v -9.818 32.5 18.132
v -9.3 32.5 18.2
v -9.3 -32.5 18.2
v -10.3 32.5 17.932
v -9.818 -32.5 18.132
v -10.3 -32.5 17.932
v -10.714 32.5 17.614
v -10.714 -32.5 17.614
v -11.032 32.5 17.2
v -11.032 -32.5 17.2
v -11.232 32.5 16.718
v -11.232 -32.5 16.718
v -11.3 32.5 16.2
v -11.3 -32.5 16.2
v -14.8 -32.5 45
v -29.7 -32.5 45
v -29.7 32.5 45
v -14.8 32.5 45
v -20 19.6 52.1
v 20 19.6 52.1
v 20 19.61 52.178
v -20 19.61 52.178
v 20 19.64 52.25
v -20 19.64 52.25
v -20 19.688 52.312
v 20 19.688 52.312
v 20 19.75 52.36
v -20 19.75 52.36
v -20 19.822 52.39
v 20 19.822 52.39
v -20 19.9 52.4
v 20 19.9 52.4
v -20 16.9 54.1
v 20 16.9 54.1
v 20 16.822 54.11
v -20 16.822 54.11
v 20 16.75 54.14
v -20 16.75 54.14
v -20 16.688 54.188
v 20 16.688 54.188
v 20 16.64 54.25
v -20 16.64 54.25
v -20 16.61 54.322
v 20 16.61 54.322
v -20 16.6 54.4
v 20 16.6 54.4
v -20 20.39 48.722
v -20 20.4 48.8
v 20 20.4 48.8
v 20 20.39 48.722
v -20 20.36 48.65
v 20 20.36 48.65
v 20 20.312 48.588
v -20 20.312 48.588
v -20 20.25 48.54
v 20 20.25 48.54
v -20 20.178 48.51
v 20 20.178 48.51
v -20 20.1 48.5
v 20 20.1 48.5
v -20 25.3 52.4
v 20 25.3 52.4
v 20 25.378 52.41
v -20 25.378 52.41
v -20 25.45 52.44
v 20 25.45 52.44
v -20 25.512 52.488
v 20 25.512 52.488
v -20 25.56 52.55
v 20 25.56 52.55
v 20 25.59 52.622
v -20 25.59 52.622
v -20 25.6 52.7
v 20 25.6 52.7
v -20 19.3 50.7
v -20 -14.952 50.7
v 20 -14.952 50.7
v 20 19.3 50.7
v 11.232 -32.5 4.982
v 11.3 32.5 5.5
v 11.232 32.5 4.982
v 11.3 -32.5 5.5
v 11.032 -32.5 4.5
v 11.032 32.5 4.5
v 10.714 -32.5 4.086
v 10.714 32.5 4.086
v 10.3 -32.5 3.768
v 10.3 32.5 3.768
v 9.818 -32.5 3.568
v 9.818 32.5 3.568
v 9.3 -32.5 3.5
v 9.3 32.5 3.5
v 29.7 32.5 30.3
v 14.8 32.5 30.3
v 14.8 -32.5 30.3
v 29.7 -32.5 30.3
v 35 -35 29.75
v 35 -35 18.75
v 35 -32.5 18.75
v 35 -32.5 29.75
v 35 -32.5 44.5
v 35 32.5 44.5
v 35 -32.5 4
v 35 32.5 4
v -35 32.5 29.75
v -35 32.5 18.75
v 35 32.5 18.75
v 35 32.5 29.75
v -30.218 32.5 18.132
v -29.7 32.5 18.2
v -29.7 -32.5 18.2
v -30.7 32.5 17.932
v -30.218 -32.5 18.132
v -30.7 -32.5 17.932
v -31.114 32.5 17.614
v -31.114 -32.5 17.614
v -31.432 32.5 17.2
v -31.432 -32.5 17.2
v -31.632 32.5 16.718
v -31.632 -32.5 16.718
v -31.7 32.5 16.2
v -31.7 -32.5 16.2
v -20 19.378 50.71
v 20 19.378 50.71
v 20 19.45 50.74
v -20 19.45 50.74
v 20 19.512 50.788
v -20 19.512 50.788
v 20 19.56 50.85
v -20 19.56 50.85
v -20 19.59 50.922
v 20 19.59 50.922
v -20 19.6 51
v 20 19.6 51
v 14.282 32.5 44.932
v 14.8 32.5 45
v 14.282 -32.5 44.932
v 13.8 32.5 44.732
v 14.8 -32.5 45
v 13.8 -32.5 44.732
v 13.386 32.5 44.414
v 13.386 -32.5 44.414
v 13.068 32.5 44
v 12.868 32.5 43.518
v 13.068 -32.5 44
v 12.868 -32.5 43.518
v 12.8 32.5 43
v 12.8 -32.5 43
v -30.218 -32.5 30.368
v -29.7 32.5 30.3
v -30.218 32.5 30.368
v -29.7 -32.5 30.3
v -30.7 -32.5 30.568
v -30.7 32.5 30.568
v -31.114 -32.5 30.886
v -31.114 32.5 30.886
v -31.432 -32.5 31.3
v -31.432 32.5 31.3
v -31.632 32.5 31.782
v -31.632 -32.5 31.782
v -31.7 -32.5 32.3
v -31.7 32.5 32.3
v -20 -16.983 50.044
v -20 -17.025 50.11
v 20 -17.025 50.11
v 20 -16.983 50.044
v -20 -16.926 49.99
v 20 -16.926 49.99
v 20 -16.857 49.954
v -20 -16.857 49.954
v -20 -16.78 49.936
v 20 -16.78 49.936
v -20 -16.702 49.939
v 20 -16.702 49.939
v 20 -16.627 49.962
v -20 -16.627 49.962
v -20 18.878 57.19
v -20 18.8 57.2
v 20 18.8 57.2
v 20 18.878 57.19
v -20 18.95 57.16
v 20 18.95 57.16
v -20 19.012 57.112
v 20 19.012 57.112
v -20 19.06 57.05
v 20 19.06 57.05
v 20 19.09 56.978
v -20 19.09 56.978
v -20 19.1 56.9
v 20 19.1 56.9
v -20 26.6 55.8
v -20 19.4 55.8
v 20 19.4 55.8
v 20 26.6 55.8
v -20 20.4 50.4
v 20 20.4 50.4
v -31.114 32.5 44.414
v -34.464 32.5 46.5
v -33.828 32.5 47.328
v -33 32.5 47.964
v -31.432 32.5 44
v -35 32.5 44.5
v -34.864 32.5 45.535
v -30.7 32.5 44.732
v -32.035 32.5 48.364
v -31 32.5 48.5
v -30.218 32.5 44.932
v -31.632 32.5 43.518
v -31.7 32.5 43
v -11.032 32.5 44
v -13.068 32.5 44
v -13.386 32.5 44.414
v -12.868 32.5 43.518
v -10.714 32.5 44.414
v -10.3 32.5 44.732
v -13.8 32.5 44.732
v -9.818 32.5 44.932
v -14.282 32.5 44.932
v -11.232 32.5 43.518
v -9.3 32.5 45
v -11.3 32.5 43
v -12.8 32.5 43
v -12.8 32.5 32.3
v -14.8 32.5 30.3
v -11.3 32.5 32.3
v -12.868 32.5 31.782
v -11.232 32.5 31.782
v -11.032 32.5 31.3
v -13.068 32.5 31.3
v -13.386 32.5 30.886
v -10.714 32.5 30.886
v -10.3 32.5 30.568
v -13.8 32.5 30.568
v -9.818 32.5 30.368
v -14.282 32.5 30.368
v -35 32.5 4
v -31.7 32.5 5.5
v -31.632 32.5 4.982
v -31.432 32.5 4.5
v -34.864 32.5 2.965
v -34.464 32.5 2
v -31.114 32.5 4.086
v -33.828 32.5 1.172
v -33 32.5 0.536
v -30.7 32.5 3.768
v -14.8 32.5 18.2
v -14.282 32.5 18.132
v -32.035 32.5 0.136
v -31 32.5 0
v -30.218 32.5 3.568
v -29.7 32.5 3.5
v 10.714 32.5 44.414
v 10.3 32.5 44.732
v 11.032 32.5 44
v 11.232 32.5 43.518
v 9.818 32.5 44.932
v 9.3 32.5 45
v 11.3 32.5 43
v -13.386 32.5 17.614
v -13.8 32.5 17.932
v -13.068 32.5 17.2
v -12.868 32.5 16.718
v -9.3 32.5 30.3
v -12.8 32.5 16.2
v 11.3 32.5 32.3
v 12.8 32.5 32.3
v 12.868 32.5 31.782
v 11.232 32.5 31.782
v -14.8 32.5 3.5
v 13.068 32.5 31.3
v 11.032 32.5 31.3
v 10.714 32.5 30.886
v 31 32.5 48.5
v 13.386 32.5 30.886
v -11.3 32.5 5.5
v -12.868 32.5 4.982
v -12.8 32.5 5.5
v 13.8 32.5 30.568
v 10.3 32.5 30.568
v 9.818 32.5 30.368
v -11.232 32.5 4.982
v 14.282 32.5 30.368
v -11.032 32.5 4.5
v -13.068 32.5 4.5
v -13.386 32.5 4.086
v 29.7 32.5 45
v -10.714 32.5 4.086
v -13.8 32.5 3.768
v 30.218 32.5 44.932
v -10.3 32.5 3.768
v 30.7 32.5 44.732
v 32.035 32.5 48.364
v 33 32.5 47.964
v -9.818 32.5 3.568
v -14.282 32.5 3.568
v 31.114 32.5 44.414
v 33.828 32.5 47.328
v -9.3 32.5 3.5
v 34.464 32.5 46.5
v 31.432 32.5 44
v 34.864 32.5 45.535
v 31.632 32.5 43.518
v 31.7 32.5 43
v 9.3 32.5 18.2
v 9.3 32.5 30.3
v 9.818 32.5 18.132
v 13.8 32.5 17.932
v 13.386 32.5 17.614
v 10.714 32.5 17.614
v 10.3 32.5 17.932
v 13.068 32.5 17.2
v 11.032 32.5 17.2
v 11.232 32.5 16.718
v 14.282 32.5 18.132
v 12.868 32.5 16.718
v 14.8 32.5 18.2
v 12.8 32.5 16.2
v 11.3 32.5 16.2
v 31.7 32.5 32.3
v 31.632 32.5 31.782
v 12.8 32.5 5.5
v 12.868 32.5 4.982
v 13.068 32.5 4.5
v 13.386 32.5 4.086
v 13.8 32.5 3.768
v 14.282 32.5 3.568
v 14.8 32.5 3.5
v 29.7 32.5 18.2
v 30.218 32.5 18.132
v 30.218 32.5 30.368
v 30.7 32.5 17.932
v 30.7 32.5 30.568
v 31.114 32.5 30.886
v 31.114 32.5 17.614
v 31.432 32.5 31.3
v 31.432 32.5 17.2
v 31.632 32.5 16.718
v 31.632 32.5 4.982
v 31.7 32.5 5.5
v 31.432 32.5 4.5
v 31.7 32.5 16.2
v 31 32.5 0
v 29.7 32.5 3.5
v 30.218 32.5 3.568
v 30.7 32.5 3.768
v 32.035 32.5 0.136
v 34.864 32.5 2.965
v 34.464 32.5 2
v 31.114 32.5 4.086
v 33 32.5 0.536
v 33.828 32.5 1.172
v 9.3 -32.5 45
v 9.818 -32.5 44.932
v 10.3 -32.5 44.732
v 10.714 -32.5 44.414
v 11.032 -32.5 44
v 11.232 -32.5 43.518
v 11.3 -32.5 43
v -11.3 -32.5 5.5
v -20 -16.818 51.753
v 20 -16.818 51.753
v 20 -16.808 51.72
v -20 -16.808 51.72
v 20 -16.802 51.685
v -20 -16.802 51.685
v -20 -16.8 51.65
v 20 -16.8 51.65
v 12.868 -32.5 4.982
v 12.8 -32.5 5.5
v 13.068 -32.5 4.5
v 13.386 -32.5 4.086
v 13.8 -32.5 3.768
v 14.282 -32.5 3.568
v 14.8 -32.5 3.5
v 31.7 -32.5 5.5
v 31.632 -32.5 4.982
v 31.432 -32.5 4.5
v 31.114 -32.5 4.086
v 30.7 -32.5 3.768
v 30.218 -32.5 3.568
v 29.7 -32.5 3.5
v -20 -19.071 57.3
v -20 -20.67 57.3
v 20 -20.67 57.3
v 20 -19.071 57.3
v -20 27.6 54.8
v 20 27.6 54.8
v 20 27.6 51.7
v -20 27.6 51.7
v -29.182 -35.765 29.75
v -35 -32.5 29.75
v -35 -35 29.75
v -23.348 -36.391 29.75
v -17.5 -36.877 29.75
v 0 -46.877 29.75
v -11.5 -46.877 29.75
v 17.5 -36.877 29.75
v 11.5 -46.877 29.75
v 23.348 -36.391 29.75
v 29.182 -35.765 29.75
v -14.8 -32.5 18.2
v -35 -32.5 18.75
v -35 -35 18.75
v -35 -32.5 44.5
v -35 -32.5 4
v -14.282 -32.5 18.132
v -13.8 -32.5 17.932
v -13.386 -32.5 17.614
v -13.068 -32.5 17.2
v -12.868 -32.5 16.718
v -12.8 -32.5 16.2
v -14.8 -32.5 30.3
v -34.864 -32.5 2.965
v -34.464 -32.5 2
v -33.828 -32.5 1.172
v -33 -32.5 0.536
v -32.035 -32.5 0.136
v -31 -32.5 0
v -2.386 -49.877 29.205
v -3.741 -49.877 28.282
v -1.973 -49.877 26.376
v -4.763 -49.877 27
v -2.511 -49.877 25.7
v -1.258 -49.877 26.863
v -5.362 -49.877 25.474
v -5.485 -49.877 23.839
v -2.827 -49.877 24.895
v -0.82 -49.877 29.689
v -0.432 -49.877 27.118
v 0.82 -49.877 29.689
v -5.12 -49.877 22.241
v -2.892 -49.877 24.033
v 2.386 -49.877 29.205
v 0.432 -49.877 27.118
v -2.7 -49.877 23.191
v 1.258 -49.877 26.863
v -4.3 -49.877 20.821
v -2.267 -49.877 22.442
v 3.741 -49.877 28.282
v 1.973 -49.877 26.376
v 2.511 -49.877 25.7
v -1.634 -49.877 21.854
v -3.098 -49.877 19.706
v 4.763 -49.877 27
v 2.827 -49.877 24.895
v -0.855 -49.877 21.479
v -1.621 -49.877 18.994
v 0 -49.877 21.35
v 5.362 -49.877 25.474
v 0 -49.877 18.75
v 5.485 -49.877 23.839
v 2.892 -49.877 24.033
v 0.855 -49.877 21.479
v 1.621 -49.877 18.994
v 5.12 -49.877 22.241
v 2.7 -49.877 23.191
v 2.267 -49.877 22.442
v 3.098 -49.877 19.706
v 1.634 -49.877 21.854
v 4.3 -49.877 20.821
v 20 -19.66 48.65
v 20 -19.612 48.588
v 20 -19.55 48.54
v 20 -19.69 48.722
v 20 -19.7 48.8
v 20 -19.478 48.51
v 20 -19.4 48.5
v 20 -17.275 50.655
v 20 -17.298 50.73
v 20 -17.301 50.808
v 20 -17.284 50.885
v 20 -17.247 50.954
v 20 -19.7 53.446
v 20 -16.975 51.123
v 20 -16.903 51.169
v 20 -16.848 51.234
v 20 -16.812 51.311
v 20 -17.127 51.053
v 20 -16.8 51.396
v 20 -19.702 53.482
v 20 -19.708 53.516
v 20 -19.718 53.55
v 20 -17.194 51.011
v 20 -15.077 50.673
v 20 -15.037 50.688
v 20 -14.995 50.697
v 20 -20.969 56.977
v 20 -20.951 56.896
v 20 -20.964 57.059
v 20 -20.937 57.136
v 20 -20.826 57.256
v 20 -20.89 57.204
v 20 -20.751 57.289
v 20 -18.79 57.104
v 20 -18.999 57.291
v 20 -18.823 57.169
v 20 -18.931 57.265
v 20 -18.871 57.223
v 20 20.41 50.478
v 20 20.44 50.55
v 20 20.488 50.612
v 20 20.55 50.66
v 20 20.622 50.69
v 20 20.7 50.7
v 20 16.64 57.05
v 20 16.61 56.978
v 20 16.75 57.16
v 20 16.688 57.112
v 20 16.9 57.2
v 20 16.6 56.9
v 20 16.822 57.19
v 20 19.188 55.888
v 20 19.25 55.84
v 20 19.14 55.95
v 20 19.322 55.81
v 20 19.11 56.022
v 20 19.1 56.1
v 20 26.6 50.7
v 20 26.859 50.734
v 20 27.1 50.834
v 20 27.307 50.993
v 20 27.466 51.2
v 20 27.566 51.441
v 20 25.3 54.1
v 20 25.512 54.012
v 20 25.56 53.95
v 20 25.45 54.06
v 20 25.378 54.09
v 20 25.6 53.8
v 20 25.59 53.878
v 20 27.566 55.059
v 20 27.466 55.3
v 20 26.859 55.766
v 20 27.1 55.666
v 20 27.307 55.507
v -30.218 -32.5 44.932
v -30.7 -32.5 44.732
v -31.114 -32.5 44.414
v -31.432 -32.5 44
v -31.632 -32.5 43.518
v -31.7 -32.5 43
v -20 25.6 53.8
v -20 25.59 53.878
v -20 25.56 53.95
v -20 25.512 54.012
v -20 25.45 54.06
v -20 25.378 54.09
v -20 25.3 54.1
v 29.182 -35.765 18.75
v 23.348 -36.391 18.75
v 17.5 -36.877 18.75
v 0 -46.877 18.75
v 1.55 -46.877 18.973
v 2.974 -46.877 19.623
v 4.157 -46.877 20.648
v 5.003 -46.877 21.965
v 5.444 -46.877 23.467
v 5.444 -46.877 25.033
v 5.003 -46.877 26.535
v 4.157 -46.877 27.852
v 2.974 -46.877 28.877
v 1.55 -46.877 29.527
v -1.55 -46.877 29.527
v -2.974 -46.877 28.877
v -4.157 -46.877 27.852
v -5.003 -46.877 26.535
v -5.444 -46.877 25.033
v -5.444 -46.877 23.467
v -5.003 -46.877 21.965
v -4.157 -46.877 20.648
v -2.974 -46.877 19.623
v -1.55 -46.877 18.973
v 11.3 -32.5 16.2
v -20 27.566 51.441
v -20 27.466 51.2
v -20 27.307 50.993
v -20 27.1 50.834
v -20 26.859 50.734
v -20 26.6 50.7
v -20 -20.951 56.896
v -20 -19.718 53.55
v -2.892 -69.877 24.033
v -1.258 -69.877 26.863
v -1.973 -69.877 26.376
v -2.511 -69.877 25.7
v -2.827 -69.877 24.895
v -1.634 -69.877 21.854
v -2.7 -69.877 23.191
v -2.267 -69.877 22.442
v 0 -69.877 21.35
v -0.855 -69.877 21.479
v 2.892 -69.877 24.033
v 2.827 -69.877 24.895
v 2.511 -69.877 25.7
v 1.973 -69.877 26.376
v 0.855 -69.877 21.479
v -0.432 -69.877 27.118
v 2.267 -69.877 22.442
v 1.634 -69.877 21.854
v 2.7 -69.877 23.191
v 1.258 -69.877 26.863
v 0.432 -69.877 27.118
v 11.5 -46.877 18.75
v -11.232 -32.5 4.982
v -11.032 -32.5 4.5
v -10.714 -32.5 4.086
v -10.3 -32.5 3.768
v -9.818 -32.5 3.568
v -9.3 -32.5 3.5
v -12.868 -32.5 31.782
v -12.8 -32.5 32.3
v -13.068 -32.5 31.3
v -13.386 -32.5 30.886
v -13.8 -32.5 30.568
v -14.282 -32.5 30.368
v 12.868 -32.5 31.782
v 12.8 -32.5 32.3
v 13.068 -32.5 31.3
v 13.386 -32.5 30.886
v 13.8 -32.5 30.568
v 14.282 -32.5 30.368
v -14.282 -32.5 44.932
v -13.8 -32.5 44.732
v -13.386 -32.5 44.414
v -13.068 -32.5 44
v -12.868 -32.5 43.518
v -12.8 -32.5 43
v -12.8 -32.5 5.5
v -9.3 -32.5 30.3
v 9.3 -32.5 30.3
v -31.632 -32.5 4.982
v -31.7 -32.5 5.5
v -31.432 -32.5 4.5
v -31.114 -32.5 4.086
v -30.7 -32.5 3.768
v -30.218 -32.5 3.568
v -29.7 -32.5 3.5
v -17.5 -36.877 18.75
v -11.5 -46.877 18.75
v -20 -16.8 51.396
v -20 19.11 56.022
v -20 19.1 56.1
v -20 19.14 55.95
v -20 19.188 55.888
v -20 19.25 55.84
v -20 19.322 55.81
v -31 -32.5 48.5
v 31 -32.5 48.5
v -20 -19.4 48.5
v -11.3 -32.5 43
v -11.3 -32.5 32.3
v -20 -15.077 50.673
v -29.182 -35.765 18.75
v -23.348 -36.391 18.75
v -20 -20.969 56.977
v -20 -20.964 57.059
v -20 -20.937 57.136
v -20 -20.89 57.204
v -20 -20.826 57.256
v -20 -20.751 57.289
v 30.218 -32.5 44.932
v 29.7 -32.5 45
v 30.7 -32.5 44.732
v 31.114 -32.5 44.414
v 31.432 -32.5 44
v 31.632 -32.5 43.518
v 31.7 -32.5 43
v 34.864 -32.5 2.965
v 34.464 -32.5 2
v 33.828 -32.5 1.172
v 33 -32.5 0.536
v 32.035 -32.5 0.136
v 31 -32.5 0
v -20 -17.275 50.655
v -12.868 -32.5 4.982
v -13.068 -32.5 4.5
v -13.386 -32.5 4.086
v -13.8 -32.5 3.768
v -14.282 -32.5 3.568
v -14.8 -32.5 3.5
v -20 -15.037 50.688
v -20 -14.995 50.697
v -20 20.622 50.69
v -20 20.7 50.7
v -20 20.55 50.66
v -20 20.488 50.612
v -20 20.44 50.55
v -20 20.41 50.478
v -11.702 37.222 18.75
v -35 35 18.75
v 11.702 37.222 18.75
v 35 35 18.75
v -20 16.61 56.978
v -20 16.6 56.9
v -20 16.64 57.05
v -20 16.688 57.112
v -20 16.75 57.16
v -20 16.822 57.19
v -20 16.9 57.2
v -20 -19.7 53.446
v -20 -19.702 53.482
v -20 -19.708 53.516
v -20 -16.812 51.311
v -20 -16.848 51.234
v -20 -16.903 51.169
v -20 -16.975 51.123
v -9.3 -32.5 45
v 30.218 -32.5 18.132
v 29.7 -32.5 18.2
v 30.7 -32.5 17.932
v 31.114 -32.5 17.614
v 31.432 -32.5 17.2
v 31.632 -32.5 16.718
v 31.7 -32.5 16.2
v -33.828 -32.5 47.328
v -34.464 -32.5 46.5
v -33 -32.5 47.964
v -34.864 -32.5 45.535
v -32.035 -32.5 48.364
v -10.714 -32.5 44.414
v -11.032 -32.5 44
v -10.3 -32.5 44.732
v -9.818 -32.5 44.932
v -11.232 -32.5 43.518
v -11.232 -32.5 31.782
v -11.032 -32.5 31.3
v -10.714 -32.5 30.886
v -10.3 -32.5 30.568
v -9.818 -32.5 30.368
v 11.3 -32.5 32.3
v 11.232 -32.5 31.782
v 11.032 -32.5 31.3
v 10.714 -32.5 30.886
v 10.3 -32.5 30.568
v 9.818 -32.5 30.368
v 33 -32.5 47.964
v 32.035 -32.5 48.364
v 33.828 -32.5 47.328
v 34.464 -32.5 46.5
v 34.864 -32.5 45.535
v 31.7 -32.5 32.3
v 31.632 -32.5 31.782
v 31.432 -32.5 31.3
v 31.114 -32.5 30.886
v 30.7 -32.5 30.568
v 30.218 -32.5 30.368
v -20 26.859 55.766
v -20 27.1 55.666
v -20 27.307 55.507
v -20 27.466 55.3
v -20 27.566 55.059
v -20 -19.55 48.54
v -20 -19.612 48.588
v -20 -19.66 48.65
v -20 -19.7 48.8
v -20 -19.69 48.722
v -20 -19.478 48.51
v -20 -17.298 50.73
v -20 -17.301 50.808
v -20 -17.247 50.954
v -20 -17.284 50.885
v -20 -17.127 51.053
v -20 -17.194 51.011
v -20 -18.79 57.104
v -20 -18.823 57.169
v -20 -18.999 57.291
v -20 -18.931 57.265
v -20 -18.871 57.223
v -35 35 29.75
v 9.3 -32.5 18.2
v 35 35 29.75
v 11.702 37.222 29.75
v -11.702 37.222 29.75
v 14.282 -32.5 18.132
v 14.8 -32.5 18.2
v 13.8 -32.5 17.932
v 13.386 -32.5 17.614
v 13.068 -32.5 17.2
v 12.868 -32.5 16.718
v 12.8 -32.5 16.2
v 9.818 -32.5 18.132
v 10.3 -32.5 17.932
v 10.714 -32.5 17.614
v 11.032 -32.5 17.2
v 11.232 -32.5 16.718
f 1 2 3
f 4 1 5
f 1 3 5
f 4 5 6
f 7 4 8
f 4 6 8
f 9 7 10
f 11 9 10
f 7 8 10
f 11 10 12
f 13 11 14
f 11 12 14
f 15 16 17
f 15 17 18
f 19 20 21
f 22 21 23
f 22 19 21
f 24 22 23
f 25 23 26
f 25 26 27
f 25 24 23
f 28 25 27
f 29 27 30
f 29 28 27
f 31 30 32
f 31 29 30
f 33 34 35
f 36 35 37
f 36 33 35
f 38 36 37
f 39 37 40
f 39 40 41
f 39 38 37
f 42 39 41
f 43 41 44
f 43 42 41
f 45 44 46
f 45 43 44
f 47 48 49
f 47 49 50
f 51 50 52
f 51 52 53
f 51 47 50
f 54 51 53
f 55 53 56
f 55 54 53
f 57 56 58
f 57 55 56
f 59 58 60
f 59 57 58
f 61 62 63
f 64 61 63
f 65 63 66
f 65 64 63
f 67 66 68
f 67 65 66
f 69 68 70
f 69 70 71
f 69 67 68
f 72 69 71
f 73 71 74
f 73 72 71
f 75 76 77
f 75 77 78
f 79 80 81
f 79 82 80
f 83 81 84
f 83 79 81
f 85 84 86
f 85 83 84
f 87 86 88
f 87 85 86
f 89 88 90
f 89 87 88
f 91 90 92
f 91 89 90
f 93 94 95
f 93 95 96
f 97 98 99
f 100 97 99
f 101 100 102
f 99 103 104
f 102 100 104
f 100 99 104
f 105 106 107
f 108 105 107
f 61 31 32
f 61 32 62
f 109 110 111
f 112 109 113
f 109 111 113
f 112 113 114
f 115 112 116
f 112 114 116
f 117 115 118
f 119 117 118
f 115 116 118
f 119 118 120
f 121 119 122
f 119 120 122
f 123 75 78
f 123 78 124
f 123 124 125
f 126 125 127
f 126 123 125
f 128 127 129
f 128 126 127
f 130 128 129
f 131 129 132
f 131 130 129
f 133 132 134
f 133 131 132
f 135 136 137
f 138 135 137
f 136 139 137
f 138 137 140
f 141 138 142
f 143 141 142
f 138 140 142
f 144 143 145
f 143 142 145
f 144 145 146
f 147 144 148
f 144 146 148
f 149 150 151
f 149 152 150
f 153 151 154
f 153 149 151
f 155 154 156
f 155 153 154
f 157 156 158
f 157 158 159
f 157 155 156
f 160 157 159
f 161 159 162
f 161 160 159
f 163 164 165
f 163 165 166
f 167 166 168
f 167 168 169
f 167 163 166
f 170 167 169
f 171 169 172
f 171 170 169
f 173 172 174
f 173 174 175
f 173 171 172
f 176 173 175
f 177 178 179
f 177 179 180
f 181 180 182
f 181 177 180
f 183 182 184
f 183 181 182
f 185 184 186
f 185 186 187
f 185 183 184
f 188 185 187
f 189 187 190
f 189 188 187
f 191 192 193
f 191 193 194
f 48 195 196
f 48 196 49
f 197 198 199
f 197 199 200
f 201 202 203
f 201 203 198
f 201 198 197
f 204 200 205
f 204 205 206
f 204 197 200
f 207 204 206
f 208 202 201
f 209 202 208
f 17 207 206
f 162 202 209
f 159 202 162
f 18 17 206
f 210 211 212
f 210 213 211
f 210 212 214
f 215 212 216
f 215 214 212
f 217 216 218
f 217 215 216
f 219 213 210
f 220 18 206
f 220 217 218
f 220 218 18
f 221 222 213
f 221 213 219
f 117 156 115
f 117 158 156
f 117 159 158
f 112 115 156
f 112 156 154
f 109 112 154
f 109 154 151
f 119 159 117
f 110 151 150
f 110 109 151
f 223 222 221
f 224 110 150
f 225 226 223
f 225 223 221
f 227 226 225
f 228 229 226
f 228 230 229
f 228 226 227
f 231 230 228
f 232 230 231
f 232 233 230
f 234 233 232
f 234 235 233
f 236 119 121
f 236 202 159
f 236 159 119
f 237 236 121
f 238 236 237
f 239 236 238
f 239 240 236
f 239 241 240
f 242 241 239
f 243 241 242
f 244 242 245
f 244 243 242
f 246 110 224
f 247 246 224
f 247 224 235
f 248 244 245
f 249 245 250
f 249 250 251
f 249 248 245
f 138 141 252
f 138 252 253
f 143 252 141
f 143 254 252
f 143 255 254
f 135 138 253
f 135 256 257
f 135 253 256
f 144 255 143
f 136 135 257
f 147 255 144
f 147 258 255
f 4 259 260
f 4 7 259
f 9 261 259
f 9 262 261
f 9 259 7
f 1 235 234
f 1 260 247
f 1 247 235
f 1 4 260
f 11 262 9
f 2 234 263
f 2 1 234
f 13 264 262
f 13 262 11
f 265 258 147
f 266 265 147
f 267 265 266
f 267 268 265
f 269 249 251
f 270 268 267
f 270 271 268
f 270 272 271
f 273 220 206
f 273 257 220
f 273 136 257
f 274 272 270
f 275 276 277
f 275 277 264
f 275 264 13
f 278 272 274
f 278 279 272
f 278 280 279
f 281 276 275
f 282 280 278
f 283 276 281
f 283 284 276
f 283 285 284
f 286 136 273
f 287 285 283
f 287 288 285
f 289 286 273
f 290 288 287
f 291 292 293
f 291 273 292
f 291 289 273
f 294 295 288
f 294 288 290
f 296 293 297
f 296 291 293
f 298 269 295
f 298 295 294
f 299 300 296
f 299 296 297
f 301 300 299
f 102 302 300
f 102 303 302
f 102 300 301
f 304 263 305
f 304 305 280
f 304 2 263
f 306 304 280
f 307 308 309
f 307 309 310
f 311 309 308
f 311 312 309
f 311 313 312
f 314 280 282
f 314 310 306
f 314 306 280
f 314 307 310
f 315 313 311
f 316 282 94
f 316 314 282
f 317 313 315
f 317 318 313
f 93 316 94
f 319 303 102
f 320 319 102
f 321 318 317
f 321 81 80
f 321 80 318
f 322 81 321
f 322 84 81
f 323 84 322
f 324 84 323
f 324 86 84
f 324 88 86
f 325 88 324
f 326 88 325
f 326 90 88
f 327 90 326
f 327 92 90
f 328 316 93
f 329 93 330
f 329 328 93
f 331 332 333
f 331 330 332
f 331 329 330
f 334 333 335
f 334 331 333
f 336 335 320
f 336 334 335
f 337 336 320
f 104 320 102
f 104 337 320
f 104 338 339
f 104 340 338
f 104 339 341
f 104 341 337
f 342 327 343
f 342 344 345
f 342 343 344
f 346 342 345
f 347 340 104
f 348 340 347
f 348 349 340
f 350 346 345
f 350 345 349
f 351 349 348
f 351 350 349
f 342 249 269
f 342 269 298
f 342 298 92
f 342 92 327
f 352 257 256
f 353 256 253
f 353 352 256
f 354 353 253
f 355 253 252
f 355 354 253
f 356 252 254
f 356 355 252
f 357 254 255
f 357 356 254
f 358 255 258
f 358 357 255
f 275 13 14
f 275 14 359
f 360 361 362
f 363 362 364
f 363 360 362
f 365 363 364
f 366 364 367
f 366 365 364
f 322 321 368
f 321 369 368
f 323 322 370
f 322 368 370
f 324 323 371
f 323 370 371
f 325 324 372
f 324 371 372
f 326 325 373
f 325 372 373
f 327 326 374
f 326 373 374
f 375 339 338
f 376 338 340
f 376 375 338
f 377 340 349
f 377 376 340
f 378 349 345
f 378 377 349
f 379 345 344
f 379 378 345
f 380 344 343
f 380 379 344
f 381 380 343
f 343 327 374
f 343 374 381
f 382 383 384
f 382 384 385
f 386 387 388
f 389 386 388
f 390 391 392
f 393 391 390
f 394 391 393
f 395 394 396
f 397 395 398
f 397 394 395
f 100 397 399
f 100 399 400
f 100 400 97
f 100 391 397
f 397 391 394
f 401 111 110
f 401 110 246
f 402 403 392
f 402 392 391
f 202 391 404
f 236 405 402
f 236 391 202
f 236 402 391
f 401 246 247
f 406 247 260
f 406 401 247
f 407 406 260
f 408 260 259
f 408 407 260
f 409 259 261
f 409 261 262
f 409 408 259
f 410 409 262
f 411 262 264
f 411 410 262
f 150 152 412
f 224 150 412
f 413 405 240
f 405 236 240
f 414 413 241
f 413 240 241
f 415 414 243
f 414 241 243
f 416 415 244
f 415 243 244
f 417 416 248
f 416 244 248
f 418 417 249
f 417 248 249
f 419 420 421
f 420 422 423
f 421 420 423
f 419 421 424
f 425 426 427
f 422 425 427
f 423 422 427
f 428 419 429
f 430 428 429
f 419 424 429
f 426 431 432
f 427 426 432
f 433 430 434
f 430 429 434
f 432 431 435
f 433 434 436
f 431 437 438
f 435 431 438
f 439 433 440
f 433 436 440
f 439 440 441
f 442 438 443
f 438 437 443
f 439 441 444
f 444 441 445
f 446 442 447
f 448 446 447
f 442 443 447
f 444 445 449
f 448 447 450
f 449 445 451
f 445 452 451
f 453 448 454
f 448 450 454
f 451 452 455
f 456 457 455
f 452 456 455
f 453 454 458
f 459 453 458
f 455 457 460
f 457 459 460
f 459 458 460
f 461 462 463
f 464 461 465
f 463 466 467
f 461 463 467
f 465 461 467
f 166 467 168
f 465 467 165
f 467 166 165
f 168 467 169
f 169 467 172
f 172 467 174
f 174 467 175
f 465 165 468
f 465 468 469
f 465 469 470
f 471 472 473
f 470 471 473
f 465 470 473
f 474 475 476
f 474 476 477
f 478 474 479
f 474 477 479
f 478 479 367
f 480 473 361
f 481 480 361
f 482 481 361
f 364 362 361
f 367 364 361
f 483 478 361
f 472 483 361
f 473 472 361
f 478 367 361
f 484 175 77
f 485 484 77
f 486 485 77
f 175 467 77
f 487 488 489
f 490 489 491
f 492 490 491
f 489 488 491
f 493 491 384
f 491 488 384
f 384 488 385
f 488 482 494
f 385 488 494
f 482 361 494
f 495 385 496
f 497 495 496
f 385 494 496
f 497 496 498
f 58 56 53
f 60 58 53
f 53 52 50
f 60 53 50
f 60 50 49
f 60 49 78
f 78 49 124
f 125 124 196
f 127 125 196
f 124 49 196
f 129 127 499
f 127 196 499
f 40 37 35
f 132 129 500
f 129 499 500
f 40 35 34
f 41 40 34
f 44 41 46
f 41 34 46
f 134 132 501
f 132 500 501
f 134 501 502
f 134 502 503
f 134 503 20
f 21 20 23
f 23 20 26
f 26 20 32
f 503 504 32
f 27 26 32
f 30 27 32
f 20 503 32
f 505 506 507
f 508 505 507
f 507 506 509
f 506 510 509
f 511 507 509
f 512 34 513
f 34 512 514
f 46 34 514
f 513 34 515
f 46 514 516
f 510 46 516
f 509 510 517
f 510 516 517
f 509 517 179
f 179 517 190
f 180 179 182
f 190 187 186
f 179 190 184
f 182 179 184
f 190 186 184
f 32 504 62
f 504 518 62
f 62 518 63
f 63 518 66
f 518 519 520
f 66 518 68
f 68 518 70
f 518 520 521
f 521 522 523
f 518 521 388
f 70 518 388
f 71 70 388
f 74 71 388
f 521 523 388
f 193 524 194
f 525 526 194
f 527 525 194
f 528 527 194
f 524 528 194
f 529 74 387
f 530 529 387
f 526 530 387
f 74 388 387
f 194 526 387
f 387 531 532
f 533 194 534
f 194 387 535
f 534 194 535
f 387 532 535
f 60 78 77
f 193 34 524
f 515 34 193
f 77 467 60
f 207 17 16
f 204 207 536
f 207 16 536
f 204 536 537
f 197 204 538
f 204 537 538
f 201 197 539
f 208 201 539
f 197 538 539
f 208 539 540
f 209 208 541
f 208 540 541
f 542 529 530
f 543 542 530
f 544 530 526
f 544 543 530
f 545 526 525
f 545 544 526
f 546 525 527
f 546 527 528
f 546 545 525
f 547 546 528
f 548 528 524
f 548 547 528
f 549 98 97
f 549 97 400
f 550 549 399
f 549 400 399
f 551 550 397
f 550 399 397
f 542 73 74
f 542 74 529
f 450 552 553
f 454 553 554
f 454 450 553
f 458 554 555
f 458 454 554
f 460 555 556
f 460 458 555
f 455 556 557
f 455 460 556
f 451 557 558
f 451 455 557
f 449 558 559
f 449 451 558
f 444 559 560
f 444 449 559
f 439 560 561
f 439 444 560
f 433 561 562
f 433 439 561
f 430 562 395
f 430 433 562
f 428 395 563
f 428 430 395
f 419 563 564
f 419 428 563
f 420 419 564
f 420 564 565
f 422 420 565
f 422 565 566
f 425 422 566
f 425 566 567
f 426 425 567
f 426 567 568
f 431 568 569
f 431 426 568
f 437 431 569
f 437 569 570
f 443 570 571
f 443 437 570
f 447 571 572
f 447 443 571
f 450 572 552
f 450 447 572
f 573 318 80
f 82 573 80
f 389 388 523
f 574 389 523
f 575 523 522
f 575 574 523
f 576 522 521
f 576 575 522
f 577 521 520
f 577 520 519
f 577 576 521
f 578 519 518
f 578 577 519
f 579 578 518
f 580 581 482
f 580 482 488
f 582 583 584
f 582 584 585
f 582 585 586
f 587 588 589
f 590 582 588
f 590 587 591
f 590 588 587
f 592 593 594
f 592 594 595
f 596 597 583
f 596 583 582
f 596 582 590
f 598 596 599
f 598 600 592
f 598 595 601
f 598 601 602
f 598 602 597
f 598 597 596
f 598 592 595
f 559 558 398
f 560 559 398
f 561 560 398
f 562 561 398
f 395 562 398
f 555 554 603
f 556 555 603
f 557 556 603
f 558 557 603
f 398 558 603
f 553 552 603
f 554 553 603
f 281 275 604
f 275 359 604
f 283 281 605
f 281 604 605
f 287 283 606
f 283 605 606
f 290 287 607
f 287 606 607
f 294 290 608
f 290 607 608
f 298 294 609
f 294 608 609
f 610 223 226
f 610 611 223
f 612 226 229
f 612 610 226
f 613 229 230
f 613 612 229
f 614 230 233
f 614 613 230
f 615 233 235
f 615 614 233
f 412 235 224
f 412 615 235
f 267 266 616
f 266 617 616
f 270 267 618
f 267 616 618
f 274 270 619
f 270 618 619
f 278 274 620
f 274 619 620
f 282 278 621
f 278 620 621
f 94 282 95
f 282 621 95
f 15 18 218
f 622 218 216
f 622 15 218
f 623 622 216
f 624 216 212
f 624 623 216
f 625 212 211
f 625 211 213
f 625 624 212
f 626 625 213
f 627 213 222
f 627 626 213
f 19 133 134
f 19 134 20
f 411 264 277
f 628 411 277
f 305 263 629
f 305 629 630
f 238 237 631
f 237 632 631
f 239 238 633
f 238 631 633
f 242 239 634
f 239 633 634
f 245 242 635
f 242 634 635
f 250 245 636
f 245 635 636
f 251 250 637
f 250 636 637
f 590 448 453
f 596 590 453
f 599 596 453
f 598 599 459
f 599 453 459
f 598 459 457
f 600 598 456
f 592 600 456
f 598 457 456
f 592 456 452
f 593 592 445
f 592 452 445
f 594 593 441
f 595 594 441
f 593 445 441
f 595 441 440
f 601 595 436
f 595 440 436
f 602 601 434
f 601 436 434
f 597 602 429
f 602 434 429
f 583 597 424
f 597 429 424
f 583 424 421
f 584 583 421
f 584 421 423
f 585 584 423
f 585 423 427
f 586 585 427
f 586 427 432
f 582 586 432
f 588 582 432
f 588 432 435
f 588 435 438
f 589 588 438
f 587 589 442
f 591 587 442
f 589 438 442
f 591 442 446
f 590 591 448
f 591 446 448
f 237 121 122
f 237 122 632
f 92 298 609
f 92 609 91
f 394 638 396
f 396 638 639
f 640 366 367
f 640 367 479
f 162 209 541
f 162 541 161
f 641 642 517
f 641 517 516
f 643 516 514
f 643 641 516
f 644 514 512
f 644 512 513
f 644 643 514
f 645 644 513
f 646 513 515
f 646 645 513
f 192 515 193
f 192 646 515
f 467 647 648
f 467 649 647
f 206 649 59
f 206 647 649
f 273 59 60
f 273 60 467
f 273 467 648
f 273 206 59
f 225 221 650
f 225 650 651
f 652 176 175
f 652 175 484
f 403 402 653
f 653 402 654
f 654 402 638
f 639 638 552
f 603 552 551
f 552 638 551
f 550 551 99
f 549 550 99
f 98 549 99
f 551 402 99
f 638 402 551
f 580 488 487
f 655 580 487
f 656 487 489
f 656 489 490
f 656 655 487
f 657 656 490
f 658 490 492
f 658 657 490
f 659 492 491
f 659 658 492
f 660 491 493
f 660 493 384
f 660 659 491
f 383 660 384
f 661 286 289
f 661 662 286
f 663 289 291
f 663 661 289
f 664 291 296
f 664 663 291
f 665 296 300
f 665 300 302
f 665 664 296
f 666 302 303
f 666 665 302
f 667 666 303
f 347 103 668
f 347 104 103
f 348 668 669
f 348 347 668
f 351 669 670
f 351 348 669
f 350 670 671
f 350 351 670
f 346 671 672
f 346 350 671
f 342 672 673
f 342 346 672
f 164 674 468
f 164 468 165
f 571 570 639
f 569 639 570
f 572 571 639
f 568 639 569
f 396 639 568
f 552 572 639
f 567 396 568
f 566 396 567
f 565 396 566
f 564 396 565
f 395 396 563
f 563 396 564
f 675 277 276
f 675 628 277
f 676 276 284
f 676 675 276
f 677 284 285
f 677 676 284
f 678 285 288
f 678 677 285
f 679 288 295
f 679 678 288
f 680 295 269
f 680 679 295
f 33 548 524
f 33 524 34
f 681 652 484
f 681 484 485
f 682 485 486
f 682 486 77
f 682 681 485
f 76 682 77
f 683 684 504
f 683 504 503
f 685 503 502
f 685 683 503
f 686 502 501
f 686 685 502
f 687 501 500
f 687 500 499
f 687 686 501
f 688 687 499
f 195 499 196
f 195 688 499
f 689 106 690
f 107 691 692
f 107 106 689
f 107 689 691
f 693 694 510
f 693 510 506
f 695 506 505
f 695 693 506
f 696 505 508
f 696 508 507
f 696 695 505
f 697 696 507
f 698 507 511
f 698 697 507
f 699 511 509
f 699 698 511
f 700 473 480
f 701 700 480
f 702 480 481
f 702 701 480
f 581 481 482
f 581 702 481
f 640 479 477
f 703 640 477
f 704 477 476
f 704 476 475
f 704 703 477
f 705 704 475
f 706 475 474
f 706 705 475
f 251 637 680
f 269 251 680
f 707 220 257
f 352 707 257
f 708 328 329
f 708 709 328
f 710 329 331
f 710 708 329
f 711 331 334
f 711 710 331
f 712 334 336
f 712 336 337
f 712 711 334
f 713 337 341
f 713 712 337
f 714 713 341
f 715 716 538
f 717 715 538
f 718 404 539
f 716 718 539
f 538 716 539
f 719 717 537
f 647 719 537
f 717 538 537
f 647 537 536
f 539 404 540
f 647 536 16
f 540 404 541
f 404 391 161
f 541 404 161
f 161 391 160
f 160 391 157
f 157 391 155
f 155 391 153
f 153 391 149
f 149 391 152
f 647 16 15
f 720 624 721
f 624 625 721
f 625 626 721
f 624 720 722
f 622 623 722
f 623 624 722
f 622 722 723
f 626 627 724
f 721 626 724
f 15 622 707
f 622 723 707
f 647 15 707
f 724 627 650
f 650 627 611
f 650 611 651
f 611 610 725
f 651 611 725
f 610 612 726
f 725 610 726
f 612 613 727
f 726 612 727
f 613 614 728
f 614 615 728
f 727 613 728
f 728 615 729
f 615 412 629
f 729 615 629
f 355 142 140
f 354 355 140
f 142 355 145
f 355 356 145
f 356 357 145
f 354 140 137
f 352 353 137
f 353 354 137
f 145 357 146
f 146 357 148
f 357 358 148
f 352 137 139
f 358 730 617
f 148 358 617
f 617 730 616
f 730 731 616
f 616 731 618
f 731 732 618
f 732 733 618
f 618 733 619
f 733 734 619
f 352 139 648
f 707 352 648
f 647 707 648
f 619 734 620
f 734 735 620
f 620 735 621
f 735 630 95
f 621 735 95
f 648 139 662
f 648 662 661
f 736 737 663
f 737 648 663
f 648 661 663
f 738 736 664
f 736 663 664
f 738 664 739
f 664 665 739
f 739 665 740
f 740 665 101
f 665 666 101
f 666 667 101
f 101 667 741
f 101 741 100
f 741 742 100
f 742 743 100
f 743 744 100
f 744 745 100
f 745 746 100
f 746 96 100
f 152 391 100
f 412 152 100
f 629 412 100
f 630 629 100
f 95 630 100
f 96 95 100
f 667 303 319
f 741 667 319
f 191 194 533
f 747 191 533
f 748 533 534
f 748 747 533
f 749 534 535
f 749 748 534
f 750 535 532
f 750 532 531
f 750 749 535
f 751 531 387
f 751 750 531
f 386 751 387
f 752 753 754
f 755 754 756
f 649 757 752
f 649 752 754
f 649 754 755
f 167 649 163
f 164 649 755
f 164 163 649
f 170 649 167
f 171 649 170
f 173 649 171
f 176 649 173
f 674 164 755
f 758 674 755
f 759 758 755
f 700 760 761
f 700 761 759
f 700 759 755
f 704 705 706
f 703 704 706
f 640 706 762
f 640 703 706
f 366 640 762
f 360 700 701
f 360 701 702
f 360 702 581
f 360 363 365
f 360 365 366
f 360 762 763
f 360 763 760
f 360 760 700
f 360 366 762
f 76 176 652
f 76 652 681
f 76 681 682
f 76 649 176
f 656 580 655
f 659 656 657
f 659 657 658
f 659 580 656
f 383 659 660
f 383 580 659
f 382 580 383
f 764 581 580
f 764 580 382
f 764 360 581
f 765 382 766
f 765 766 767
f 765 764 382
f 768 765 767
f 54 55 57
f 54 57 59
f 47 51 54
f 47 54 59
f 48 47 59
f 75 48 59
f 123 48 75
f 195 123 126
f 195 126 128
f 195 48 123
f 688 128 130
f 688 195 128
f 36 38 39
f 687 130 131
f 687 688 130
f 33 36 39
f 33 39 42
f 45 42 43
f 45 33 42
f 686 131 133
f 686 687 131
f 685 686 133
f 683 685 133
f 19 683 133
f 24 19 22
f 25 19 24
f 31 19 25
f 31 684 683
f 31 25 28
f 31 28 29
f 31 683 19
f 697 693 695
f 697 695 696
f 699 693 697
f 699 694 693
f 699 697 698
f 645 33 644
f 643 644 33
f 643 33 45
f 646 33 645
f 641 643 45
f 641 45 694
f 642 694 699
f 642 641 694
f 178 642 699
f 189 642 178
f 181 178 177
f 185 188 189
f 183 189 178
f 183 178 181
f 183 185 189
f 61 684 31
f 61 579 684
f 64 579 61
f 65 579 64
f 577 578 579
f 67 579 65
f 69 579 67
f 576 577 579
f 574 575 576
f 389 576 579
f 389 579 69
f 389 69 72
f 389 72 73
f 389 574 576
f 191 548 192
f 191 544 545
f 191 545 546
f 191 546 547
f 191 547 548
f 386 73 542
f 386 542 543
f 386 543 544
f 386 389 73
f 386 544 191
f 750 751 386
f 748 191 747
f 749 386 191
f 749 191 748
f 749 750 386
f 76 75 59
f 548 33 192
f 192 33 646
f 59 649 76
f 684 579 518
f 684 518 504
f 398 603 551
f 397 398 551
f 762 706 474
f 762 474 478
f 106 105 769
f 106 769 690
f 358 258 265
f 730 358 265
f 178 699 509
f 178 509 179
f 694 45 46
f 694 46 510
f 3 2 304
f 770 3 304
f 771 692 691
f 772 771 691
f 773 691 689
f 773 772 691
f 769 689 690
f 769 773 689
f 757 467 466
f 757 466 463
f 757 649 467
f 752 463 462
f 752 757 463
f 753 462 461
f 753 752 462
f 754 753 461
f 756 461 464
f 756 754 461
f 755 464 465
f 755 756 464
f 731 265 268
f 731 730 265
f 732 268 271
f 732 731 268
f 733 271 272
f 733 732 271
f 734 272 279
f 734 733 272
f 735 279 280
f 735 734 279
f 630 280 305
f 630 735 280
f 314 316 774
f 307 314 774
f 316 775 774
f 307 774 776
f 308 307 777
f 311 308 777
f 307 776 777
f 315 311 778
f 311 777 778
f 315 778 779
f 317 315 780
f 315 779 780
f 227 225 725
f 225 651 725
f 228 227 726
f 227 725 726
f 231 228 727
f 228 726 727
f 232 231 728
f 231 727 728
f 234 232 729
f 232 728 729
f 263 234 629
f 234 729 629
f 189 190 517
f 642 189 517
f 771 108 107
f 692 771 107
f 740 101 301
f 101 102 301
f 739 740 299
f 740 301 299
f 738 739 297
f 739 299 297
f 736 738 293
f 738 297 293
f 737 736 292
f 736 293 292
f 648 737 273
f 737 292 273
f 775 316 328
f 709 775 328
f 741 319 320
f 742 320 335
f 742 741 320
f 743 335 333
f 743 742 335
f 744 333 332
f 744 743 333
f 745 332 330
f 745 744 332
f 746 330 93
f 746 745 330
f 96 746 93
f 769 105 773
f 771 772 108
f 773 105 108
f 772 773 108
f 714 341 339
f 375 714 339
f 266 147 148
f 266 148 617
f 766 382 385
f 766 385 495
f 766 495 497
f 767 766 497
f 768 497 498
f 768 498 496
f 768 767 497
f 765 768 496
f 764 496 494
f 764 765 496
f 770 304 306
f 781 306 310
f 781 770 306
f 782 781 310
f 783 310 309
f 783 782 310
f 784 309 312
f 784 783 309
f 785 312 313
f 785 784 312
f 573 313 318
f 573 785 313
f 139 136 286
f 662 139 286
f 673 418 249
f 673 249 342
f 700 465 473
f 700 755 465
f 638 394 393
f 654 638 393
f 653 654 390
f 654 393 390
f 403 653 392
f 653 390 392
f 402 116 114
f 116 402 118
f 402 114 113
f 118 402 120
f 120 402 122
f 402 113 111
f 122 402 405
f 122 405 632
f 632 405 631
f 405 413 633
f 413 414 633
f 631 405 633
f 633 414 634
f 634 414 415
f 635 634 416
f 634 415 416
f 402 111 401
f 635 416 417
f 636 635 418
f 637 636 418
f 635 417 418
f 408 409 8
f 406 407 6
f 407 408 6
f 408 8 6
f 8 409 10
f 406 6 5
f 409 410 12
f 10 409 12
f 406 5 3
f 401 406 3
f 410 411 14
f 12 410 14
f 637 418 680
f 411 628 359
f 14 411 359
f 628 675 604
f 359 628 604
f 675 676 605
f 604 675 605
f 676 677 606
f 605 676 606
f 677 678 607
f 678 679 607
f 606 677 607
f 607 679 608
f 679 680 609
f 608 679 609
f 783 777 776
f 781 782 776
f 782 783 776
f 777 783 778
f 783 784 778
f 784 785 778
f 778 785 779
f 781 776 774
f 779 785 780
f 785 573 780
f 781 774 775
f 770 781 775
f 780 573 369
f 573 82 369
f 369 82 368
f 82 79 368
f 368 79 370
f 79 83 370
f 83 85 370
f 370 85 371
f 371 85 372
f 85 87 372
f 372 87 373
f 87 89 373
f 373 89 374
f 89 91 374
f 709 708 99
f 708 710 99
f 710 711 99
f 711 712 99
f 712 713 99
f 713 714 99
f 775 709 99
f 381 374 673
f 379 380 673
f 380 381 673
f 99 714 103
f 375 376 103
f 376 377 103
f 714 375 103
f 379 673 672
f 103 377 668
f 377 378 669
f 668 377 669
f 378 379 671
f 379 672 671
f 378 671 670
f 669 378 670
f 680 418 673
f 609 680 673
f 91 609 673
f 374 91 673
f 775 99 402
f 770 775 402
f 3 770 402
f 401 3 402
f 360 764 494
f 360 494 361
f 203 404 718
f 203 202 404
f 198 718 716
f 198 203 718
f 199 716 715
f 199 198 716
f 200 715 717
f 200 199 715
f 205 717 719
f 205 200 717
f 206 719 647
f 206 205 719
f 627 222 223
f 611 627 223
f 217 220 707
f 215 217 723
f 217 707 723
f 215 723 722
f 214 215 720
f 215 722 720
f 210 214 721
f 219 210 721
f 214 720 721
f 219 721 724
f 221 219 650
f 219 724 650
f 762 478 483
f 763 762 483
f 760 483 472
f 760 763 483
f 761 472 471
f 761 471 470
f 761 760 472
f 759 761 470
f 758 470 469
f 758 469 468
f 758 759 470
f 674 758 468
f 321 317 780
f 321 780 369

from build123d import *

# Parameters (mm, degrees)
SKETCH_1_W                  = 70
SKETCH_1_H                  = 65
EXTRUDE_1_DEPTH             = 48.5
CUT_EXTRUDE_1_REACH         = 67
SKETCH_2_W                  = 22.6
SKETCH_2_H                  = 14.7
SKETCH_2_W_2                = 18.9
SKETCH_3_W                  = 70
SKETCH_3_H                  = 11
EXTRUDE_2_DEPTH             = 5
CUT_EXTRUDE_4_DEPTH         = 11
EXTRUDE_3_REACH             = 26.25
EXTRUDE_3_DIRECTION_2_REACH = 26.25
EXTRUDE_6_DEPTH             = 20
FILLET_1_R                  = 4
FILLET_2_R                  = 2
SKETCH_13_OUTSIDE_W         = 97.154
SKETCH_13_OUTSIDE_H         = 84.454
SKETCH_13_OUTSIDE_R         = 5.5
CUT_EXTRUDE_8_DEPTH         = 3
SKETCH_14_R                 = 2.9
EXTRUDE_7_DEPTH             = 20


with BuildPart() as part:
    # Эскиз1 → Бобышка-Вытянуть1 (new body)
    with BuildSketch(Plane.XY):
        Rectangle(SKETCH_1_W, SKETCH_1_H)
    extrude(amount=EXTRUDE_1_DEPTH)

    # Эскиз2 → Вырез-Вытянуть1 (cut, up to next)
    with BuildSketch(Plane(origin=(0, 32.5, 0), x_dir=(1, 0, 0), z_dir=(0, 1, 0)), mode=Mode.PRIVATE) as cut_extrude_1_sk1:
        with Locations((0, -10.85)):
            Rectangle(SKETCH_2_W, SKETCH_2_H)
    cut_extrude_1_tool1 = extrude(cut_extrude_1_sk1.sketch, amount=-CUT_EXTRUDE_1_REACH, mode=Mode.PRIVATE) & part.part
    add(cut_extrude_1_tool1.solids().sort_by_distance((0, 32.5, 10.85))[0], mode=Mode.SUBTRACT)
    # Эскиз2 → Вырез-Вытянуть1 (cut, up to next)
    with BuildSketch(Plane(origin=(0, 32.5, 0), x_dir=(1, 0, 0), z_dir=(0, 1, 0)), mode=Mode.PRIVATE) as cut_extrude_1_sk2:
        with Locations((22.25, -10.85)):
            Rectangle(SKETCH_2_W_2, SKETCH_2_H)
    cut_extrude_1_tool2 = extrude(cut_extrude_1_sk2.sketch, amount=-CUT_EXTRUDE_1_REACH, mode=Mode.PRIVATE) & part.part
    add(cut_extrude_1_tool2.solids().sort_by_distance((22.25, 32.5, 10.85))[0], mode=Mode.SUBTRACT)
    # Эскиз2 → Вырез-Вытянуть1 (cut, up to next)
    with BuildSketch(Plane(origin=(0, 32.5, 0), x_dir=(1, 0, 0), z_dir=(0, 1, 0)), mode=Mode.PRIVATE) as cut_extrude_1_sk3:
        with Locations((-22.25, -10.85)):
            Rectangle(SKETCH_2_W_2, SKETCH_2_H)
    cut_extrude_1_tool3 = extrude(cut_extrude_1_sk3.sketch, amount=-CUT_EXTRUDE_1_REACH, mode=Mode.PRIVATE) & part.part
    add(cut_extrude_1_tool3.solids().sort_by_distance((-22.25, 32.5, 10.85))[0], mode=Mode.SUBTRACT)
    # Эскиз2 → Вырез-Вытянуть1 (cut, up to next)
    with BuildSketch(Plane(origin=(0, 32.5, 0), x_dir=(1, 0, 0), z_dir=(0, 1, 0)), mode=Mode.PRIVATE) as cut_extrude_1_sk4:
        with Locations((22.25, -37.65)):
            Rectangle(SKETCH_2_W_2, SKETCH_2_H)
    cut_extrude_1_tool4 = extrude(cut_extrude_1_sk4.sketch, amount=-CUT_EXTRUDE_1_REACH, mode=Mode.PRIVATE) & part.part
    add(cut_extrude_1_tool4.solids().sort_by_distance((22.25, 32.5, 37.65))[0], mode=Mode.SUBTRACT)
    # Эскиз2 → Вырез-Вытянуть1 (cut, up to next)
    with BuildSketch(Plane(origin=(0, 32.5, 0), x_dir=(1, 0, 0), z_dir=(0, 1, 0)), mode=Mode.PRIVATE) as cut_extrude_1_sk5:
        with Locations((0, -37.65)):
            Rectangle(SKETCH_2_W, SKETCH_2_H)
    cut_extrude_1_tool5 = extrude(cut_extrude_1_sk5.sketch, amount=-CUT_EXTRUDE_1_REACH, mode=Mode.PRIVATE) & part.part
    add(cut_extrude_1_tool5.solids().sort_by_distance((0, 32.5, 37.65))[0], mode=Mode.SUBTRACT)
    # Эскиз2 → Вырез-Вытянуть1 (cut, up to next)
    with BuildSketch(Plane(origin=(0, 32.5, 0), x_dir=(1, 0, 0), z_dir=(0, 1, 0)), mode=Mode.PRIVATE) as cut_extrude_1_sk6:
        with Locations((-22.25, -37.65)):
            Rectangle(SKETCH_2_W_2, SKETCH_2_H)
    cut_extrude_1_tool6 = extrude(cut_extrude_1_sk6.sketch, amount=-CUT_EXTRUDE_1_REACH, mode=Mode.PRIVATE) & part.part
    add(cut_extrude_1_tool6.solids().sort_by_distance((-22.25, 32.5, 37.65))[0], mode=Mode.SUBTRACT)


with BuildPart() as body_2:
    # Эскиз3 → Бобышка-Вытянуть2 (new body)
    with BuildSketch(Plane(origin=(0, 32.5, 0), x_dir=(1, 0, 0), z_dir=(0, 1, 0))):
        with Locations((0, -24.25)):
            Rectangle(SKETCH_3_W, SKETCH_3_H)
    extrude_2 = extrude(amount=EXTRUDE_2_DEPTH)

    # Эскиз4 → Вырез-Вытянуть4 (cut)
    with BuildSketch(Plane.XY.offset(29.75)):
        with BuildLine():
            Line((-35, 35), (-35, 41))
            Line((-35, 41), (35, 41))
            Line((35, 41), (35, 35))
            ThreePointArc((35, 35), (0, 37.5), (-35, 35))
        make_face()
    cut_extrude_4 = extrude(amount=-CUT_EXTRUDE_4_DEPTH, mode=Mode.SUBTRACT)


with BuildPart() as part_1:
    add(part.part)

    # Зеркальное отражение2: Бобышка-Вытянуть2, Вырез-Вытянуть4 across plane
    add(extrude_2.mirror(Plane.ZX))
    add(cut_extrude_4.mirror(Plane.ZX), mode=Mode.SUBTRACT)

    # Бобышка-Вытянуть3: up to this face of the body (flat: up to its plane)
    extrude_3_end = Plane(part_1.part.faces().sort_by_distance((0, -34.650725053, 18.75))[0])
    # Эскиз5 → Бобышка-Вытянуть3 (add, up to the picked face)
    with BuildSketch(Plane(origin=(0, 0, 24.25), x_dir=(-1, 0, 0), z_dir=(0, 0, -1)), mode=Mode.PRIVATE) as extrude_3_sk1:
        with BuildLine():
            Line((-11.5, -46.877385485), (-17.5, -36.877385485))
            ThreePointArc((-17.5, -36.877385485), (0, -37.5), (17.5, -36.877385485))
            Line((17.5, -36.877385485), (11.5, -46.877385485))
            Line((11.5, -46.877385485), (6.15, -46.877385485))
            Line((6.15, -46.877385485), (6.15, -49.877385485))
            Line((6.15, -49.877385485), (-6.15, -49.877385485))
            Line((-6.15, -49.877385485), (-6.15, -46.877385485))
            Line((-6.15, -46.877385485), (-11.5, -46.877385485))
        make_face()
    extrude_3_tool1 = split(extrude(extrude_3_sk1.sketch, amount=EXTRUDE_3_REACH, mode=Mode.PRIVATE), bisect_by=extrude_3_end, keep=Keep.BOTH, mode=Mode.PRIVATE)
    add(extrude_3_tool1.solids().sort_by(Axis((0, -42.546106, 24.25), (0, 0, -1)))[0])

    # Бобышка-Вытянуть3 direction 2: up to this face of the body (flat: up to its plane)
    extrude_3_direction_2_end = Plane(part_1.part.faces().sort_by_distance((0, -34.650725053, 29.75))[0])
    # Эскиз5 → Бобышка-Вытянуть3 direction 2 (add, up to the picked face)
    with BuildSketch(Plane(origin=(0, 0, 24.25), x_dir=(-1, 0, 0), z_dir=(0, 0, -1)), mode=Mode.PRIVATE) as extrude_3_direction_2_sk1:
        with BuildLine():
            Line((-11.5, -46.877385485), (-17.5, -36.877385485))
            ThreePointArc((-17.5, -36.877385485), (0, -37.5), (17.5, -36.877385485))
            Line((17.5, -36.877385485), (11.5, -46.877385485))
            Line((11.5, -46.877385485), (6.15, -46.877385485))
            Line((6.15, -46.877385485), (6.15, -49.877385485))
            Line((6.15, -49.877385485), (-6.15, -49.877385485))
            Line((-6.15, -49.877385485), (-6.15, -46.877385485))
            Line((-6.15, -46.877385485), (-11.5, -46.877385485))
        make_face()
    extrude_3_direction_2_tool1 = split(extrude(extrude_3_direction_2_sk1.sketch, amount=-EXTRUDE_3_DIRECTION_2_REACH, mode=Mode.PRIVATE), bisect_by=extrude_3_direction_2_end, keep=Keep.BOTH, mode=Mode.PRIVATE)
    add(extrude_3_direction_2_tool1.solids().sort_by(Axis((0, -42.546106, 24.25), (0, 0, 1)))[0])

    # Эскиз11 → Бобышка-Вытянуть6 (add, symmetric)
    with BuildSketch(Plane.ZY):
        with BuildLine():
            Line((48.8, -19.7), (53.446494712, -19.7))
            ThreePointArc((53.446494712, -19.7), (53.499168801, -19.704660466), (53.550206319, -19.718497065))
            Line((53.550206319, -19.718497065), (56.896288392, -20.951264145))
            ThreePointArc((56.896288392, -20.951264145), (57.171590381, -20.915844003), (57.3, -20.66976121))
            Line((57.3, -20.66976121), (57.3, -19.071198836))
            ThreePointArc((57.3, -19.071198836), (57.246082793, -18.899608455), (57.103711608, -18.789695901))
            Line((57.103711608, -18.789695901), (51.753314767, -16.818497065))
            ThreePointArc((51.753314767, -16.818497065), (51.702277249, -16.804660466), (51.649603159, -16.8))
            Line((51.649603159, -16.8), (51.395615132, -16.8))
            ThreePointArc((51.395615132, -16.8), (51.233596615, -16.847512377), (51.122897329, -16.975))
            Line((51.122897329, -16.975), (51.053098899, -17.127282197))
            ThreePointArc((51.053098899, -17.127282197), (50.884833356, -17.283511153), (50.655381096, -17.275))
            Line((50.655381096, -17.275), (50.10994549, -17.025))
            ThreePointArc((50.10994549, -17.025), (49.953716535, -16.856734457), (49.962227687, -16.627282197))
            Line((49.962227687, -16.627282197), (50.672717803, -15.077175771))
            ThreePointArc((50.672717803, -15.077175771), (50.693100103, -15.016147089), (50.7, -14.952175771))
            Line((50.7, -14.952175771), (50.7, 19.3))
            ThreePointArc((50.7, 19.3), (50.787867966, 19.512132034), (51, 19.6))
            Line((51, 19.6), (52.1, 19.6))
            ThreePointArc((52.1, 19.6), (52.312132034, 19.687867966), (52.4, 19.9))
            Line((52.4, 19.9), (52.4, 25.3))
            ThreePointArc((52.4, 25.3), (52.487867966, 25.512132034), (52.7, 25.6))
            Line((52.7, 25.6), (53.8, 25.6))
            ThreePointArc((53.8, 25.6), (54.012132034, 25.512132034), (54.1, 25.3))
            Line((54.1, 25.3), (54.1, 16.9))
            ThreePointArc((54.1, 16.9), (54.187867966, 16.687867966), (54.4, 16.6))
            Line((54.4, 16.6), (56.9, 16.6))
            ThreePointArc((56.9, 16.6), (57.112132034, 16.687867966), (57.2, 16.9))
            Line((57.2, 16.9), (57.2, 18.8))
            ThreePointArc((57.2, 18.8), (57.112132034, 19.012132034), (56.9, 19.1))
            Line((56.9, 19.1), (56.1, 19.1))
            ThreePointArc((56.1, 19.1), (55.887867966, 19.187867966), (55.8, 19.4))
            Line((55.8, 19.4), (55.8, 26.6))
            ThreePointArc((55.8, 26.6), (55.507106781, 27.307106781), (54.8, 27.6))
            Line((54.8, 27.6), (51.7, 27.6))
            ThreePointArc((51.7, 27.6), (50.992893219, 27.307106781), (50.7, 26.6))
            Line((50.7, 26.6), (50.7, 20.7))
            ThreePointArc((50.7, 20.7), (50.612132034, 20.487867966), (50.4, 20.4))
            Line((50.4, 20.4), (48.8, 20.4))
            ThreePointArc((48.8, 20.4), (48.587867966, 20.312132034), (48.5, 20.1))
            Line((48.5, 20.1), (48.5, -19.4))
            ThreePointArc((48.5, -19.4), (48.587867966, -19.612132034), (48.8, -19.7))
        make_face()
    extrude(amount=EXTRUDE_6_DEPTH, both=True)

    # Скругление1
    fillet_1_edges = [part_1.edges().sort_by_distance(p)[0] for p in [
        (-35, 0, 48.5),
        (35, 0, 48.5),
        (-35, 0, 0),
        (35, 0, 0),
    ]]
    fillet(fillet_1_edges, radius=FILLET_1_R)

    # Скругление2
    fillet_2_edges = [part_1.edges().sort_by_distance(p)[0] for p in [
        (31.7, 0, 3.5),
        (31.7, 0, 18.2),
        (12.8, 0, 18.2),
        (12.8, 0, 3.5),
        (-12.8, 0, 3.5),
        (-12.8, 0, 18.2),
        (-31.7, 0, 18.2),
        (-31.7, 0, 3.5),
        (12.8, 0, 45),
        (12.8, 0, 30.3),
        (31.7, 0, 30.3),
        (31.7, 0, 45),
        (-11.3, 0, 45),
        (-11.3, 0, 30.3),
        (11.3, 0, 30.3),
        (11.3, 0, 45),
        (-31.7, 0, 45),
        (-31.7, 0, 30.3),
        (-12.8, 0, 30.3),
        (-12.8, 0, 45),
        (11.3, 0, 3.5),
        (11.3, 0, 18.2),
        (-11.3, 0, 18.2),
        (-11.3, 0, 3.5),
    ]]
    fillet(fillet_2_edges, radius=FILLET_2_R)

    # Эскиз13 outside → Вырез-Вытянуть8 (cut)
    with BuildSketch(Plane.XZ.offset(49.877385485)):
        with Locations((0, 28.65)):
            Rectangle(SKETCH_13_OUTSIDE_W, SKETCH_13_OUTSIDE_H)
        with Locations(Location((0, 24.25, 0), (0, 0, 270))):  # turned: the seam where the file's is
            Circle(SKETCH_13_OUTSIDE_R, mode=Mode.SUBTRACT)
    extrude(amount=-CUT_EXTRUDE_8_DEPTH, mode=Mode.SUBTRACT)

    # Эскиз14 → Бобышка-Вытянуть7 (add)
    with BuildSketch(Plane.XZ.offset(49.877385485)):
        with Locations(Location((0, 24.25, 0), (0, 0, 270))):  # turned: the seam where the file's is
            Circle(SKETCH_14_R)
    extrude(amount=EXTRUDE_7_DEPTH)


solid = Compound([body_2.part, part_1.part])
